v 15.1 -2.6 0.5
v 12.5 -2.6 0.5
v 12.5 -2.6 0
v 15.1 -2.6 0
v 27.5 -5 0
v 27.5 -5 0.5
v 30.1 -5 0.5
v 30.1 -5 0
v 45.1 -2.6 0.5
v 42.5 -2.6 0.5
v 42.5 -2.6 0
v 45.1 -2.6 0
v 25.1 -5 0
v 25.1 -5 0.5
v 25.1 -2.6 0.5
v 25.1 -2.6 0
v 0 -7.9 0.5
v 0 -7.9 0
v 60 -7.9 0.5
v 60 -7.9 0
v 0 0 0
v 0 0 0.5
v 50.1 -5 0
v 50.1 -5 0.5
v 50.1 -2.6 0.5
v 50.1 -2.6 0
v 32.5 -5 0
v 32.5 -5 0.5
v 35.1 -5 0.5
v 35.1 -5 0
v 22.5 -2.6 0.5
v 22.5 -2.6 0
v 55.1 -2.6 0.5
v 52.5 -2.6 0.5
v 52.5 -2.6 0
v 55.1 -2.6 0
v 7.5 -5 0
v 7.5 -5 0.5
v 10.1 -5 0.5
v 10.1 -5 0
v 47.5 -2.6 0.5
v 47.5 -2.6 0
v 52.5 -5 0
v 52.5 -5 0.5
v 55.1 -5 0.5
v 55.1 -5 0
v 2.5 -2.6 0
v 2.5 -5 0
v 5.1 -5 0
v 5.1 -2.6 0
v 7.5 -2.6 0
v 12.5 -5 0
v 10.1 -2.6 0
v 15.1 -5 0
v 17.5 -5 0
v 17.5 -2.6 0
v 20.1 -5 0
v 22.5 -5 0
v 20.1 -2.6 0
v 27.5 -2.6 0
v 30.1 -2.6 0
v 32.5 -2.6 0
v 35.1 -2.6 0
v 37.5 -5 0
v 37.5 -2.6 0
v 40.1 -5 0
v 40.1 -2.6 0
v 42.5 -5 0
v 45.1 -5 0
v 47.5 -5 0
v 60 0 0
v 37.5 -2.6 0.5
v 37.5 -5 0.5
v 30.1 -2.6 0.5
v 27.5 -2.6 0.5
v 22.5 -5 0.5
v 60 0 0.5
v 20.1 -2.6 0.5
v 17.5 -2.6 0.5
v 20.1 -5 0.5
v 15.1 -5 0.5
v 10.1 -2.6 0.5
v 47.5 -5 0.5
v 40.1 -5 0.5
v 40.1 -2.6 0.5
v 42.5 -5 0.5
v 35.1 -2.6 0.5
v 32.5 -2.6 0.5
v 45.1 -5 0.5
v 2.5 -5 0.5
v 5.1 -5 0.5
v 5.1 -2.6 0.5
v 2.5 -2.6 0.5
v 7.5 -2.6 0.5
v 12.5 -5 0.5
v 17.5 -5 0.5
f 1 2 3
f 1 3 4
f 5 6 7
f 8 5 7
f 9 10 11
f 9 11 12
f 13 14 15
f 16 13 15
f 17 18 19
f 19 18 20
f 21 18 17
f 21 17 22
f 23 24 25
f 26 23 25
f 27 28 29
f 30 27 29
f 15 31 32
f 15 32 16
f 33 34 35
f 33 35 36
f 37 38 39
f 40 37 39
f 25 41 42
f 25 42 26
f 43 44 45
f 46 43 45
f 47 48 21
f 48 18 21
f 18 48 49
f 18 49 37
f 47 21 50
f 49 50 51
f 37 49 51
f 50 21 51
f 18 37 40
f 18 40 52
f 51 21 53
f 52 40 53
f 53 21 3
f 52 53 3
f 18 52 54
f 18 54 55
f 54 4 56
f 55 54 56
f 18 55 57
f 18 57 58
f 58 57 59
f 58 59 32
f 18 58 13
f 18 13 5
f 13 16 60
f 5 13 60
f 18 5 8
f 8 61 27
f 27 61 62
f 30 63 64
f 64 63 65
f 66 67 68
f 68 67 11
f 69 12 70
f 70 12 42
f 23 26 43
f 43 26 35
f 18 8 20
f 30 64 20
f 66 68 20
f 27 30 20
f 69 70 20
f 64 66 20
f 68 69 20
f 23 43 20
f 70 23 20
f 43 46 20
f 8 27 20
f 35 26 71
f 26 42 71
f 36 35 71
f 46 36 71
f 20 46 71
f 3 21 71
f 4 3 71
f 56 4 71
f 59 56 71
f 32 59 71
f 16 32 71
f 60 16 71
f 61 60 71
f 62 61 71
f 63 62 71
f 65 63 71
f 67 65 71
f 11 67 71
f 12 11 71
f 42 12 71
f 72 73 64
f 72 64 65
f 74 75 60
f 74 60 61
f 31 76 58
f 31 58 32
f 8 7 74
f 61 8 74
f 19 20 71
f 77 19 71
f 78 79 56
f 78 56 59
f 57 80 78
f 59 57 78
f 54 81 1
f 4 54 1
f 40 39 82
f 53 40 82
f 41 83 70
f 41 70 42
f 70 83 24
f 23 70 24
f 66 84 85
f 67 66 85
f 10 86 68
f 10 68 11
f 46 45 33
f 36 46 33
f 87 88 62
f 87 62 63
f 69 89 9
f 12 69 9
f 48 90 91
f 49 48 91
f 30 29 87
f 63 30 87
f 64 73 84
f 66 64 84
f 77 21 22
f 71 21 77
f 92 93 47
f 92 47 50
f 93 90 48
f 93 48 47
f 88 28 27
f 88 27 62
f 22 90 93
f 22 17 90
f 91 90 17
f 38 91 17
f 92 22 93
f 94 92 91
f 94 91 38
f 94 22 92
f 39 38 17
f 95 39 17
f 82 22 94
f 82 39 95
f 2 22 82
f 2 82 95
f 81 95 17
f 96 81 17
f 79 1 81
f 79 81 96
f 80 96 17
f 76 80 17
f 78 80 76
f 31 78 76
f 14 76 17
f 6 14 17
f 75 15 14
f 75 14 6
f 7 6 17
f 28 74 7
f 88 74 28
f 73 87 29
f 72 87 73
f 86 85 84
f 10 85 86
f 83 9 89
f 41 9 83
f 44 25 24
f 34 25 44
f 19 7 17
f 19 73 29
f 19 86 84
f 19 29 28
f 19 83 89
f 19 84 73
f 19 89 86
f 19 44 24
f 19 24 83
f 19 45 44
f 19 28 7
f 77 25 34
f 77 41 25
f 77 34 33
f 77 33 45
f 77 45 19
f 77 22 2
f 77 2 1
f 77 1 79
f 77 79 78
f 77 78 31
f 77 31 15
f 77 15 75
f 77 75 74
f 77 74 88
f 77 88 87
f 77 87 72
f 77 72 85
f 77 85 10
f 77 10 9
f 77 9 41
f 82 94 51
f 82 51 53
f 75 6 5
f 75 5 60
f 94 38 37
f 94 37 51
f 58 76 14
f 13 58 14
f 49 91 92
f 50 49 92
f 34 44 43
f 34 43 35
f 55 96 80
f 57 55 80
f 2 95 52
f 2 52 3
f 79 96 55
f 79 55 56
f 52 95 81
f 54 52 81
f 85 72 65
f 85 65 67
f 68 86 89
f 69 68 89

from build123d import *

# Parameters (mm, degrees)
SKETCH1_W           = 60
SKETCH1_H           = 7.9
BOSS_EXTRUDE1_DEPTH = 0.5
SKETCH2_W           = 2.6
SKETCH2_H           = 2.4
CUT_EXTRUDE1_DEPTH  = 61.519914078
LPATTERN1_COUNT     = 11
LPATTERN1_PITCH     = 5


with BuildPart() as part:
    # Sketch1 → Boss-Extrude1 (new body)
    with BuildSketch(Plane.XY):
        with Locations((30, -3.95)):
            Rectangle(SKETCH1_W, SKETCH1_H)
    extrude(amount=BOSS_EXTRUDE1_DEPTH)

    # Sketch2 → Cut-Extrude1 (cut, symmetric)
    with BuildSketch(Plane.XY.offset(0.5)):
        with Locations((3.8, -3.8)):
            Rectangle(SKETCH2_W, SKETCH2_H)
    cut_extrude1 = extrude(amount=CUT_EXTRUDE1_DEPTH, both=True, mode=Mode.SUBTRACT)

    # LPattern1: Cut-Extrude1 ×11
    with Locations(*[(i * LPATTERN1_PITCH, 0, 0) for i in range(1, LPATTERN1_COUNT)]):
        add(cut_extrude1, mode=Mode.SUBTRACT)


solid = part.part
